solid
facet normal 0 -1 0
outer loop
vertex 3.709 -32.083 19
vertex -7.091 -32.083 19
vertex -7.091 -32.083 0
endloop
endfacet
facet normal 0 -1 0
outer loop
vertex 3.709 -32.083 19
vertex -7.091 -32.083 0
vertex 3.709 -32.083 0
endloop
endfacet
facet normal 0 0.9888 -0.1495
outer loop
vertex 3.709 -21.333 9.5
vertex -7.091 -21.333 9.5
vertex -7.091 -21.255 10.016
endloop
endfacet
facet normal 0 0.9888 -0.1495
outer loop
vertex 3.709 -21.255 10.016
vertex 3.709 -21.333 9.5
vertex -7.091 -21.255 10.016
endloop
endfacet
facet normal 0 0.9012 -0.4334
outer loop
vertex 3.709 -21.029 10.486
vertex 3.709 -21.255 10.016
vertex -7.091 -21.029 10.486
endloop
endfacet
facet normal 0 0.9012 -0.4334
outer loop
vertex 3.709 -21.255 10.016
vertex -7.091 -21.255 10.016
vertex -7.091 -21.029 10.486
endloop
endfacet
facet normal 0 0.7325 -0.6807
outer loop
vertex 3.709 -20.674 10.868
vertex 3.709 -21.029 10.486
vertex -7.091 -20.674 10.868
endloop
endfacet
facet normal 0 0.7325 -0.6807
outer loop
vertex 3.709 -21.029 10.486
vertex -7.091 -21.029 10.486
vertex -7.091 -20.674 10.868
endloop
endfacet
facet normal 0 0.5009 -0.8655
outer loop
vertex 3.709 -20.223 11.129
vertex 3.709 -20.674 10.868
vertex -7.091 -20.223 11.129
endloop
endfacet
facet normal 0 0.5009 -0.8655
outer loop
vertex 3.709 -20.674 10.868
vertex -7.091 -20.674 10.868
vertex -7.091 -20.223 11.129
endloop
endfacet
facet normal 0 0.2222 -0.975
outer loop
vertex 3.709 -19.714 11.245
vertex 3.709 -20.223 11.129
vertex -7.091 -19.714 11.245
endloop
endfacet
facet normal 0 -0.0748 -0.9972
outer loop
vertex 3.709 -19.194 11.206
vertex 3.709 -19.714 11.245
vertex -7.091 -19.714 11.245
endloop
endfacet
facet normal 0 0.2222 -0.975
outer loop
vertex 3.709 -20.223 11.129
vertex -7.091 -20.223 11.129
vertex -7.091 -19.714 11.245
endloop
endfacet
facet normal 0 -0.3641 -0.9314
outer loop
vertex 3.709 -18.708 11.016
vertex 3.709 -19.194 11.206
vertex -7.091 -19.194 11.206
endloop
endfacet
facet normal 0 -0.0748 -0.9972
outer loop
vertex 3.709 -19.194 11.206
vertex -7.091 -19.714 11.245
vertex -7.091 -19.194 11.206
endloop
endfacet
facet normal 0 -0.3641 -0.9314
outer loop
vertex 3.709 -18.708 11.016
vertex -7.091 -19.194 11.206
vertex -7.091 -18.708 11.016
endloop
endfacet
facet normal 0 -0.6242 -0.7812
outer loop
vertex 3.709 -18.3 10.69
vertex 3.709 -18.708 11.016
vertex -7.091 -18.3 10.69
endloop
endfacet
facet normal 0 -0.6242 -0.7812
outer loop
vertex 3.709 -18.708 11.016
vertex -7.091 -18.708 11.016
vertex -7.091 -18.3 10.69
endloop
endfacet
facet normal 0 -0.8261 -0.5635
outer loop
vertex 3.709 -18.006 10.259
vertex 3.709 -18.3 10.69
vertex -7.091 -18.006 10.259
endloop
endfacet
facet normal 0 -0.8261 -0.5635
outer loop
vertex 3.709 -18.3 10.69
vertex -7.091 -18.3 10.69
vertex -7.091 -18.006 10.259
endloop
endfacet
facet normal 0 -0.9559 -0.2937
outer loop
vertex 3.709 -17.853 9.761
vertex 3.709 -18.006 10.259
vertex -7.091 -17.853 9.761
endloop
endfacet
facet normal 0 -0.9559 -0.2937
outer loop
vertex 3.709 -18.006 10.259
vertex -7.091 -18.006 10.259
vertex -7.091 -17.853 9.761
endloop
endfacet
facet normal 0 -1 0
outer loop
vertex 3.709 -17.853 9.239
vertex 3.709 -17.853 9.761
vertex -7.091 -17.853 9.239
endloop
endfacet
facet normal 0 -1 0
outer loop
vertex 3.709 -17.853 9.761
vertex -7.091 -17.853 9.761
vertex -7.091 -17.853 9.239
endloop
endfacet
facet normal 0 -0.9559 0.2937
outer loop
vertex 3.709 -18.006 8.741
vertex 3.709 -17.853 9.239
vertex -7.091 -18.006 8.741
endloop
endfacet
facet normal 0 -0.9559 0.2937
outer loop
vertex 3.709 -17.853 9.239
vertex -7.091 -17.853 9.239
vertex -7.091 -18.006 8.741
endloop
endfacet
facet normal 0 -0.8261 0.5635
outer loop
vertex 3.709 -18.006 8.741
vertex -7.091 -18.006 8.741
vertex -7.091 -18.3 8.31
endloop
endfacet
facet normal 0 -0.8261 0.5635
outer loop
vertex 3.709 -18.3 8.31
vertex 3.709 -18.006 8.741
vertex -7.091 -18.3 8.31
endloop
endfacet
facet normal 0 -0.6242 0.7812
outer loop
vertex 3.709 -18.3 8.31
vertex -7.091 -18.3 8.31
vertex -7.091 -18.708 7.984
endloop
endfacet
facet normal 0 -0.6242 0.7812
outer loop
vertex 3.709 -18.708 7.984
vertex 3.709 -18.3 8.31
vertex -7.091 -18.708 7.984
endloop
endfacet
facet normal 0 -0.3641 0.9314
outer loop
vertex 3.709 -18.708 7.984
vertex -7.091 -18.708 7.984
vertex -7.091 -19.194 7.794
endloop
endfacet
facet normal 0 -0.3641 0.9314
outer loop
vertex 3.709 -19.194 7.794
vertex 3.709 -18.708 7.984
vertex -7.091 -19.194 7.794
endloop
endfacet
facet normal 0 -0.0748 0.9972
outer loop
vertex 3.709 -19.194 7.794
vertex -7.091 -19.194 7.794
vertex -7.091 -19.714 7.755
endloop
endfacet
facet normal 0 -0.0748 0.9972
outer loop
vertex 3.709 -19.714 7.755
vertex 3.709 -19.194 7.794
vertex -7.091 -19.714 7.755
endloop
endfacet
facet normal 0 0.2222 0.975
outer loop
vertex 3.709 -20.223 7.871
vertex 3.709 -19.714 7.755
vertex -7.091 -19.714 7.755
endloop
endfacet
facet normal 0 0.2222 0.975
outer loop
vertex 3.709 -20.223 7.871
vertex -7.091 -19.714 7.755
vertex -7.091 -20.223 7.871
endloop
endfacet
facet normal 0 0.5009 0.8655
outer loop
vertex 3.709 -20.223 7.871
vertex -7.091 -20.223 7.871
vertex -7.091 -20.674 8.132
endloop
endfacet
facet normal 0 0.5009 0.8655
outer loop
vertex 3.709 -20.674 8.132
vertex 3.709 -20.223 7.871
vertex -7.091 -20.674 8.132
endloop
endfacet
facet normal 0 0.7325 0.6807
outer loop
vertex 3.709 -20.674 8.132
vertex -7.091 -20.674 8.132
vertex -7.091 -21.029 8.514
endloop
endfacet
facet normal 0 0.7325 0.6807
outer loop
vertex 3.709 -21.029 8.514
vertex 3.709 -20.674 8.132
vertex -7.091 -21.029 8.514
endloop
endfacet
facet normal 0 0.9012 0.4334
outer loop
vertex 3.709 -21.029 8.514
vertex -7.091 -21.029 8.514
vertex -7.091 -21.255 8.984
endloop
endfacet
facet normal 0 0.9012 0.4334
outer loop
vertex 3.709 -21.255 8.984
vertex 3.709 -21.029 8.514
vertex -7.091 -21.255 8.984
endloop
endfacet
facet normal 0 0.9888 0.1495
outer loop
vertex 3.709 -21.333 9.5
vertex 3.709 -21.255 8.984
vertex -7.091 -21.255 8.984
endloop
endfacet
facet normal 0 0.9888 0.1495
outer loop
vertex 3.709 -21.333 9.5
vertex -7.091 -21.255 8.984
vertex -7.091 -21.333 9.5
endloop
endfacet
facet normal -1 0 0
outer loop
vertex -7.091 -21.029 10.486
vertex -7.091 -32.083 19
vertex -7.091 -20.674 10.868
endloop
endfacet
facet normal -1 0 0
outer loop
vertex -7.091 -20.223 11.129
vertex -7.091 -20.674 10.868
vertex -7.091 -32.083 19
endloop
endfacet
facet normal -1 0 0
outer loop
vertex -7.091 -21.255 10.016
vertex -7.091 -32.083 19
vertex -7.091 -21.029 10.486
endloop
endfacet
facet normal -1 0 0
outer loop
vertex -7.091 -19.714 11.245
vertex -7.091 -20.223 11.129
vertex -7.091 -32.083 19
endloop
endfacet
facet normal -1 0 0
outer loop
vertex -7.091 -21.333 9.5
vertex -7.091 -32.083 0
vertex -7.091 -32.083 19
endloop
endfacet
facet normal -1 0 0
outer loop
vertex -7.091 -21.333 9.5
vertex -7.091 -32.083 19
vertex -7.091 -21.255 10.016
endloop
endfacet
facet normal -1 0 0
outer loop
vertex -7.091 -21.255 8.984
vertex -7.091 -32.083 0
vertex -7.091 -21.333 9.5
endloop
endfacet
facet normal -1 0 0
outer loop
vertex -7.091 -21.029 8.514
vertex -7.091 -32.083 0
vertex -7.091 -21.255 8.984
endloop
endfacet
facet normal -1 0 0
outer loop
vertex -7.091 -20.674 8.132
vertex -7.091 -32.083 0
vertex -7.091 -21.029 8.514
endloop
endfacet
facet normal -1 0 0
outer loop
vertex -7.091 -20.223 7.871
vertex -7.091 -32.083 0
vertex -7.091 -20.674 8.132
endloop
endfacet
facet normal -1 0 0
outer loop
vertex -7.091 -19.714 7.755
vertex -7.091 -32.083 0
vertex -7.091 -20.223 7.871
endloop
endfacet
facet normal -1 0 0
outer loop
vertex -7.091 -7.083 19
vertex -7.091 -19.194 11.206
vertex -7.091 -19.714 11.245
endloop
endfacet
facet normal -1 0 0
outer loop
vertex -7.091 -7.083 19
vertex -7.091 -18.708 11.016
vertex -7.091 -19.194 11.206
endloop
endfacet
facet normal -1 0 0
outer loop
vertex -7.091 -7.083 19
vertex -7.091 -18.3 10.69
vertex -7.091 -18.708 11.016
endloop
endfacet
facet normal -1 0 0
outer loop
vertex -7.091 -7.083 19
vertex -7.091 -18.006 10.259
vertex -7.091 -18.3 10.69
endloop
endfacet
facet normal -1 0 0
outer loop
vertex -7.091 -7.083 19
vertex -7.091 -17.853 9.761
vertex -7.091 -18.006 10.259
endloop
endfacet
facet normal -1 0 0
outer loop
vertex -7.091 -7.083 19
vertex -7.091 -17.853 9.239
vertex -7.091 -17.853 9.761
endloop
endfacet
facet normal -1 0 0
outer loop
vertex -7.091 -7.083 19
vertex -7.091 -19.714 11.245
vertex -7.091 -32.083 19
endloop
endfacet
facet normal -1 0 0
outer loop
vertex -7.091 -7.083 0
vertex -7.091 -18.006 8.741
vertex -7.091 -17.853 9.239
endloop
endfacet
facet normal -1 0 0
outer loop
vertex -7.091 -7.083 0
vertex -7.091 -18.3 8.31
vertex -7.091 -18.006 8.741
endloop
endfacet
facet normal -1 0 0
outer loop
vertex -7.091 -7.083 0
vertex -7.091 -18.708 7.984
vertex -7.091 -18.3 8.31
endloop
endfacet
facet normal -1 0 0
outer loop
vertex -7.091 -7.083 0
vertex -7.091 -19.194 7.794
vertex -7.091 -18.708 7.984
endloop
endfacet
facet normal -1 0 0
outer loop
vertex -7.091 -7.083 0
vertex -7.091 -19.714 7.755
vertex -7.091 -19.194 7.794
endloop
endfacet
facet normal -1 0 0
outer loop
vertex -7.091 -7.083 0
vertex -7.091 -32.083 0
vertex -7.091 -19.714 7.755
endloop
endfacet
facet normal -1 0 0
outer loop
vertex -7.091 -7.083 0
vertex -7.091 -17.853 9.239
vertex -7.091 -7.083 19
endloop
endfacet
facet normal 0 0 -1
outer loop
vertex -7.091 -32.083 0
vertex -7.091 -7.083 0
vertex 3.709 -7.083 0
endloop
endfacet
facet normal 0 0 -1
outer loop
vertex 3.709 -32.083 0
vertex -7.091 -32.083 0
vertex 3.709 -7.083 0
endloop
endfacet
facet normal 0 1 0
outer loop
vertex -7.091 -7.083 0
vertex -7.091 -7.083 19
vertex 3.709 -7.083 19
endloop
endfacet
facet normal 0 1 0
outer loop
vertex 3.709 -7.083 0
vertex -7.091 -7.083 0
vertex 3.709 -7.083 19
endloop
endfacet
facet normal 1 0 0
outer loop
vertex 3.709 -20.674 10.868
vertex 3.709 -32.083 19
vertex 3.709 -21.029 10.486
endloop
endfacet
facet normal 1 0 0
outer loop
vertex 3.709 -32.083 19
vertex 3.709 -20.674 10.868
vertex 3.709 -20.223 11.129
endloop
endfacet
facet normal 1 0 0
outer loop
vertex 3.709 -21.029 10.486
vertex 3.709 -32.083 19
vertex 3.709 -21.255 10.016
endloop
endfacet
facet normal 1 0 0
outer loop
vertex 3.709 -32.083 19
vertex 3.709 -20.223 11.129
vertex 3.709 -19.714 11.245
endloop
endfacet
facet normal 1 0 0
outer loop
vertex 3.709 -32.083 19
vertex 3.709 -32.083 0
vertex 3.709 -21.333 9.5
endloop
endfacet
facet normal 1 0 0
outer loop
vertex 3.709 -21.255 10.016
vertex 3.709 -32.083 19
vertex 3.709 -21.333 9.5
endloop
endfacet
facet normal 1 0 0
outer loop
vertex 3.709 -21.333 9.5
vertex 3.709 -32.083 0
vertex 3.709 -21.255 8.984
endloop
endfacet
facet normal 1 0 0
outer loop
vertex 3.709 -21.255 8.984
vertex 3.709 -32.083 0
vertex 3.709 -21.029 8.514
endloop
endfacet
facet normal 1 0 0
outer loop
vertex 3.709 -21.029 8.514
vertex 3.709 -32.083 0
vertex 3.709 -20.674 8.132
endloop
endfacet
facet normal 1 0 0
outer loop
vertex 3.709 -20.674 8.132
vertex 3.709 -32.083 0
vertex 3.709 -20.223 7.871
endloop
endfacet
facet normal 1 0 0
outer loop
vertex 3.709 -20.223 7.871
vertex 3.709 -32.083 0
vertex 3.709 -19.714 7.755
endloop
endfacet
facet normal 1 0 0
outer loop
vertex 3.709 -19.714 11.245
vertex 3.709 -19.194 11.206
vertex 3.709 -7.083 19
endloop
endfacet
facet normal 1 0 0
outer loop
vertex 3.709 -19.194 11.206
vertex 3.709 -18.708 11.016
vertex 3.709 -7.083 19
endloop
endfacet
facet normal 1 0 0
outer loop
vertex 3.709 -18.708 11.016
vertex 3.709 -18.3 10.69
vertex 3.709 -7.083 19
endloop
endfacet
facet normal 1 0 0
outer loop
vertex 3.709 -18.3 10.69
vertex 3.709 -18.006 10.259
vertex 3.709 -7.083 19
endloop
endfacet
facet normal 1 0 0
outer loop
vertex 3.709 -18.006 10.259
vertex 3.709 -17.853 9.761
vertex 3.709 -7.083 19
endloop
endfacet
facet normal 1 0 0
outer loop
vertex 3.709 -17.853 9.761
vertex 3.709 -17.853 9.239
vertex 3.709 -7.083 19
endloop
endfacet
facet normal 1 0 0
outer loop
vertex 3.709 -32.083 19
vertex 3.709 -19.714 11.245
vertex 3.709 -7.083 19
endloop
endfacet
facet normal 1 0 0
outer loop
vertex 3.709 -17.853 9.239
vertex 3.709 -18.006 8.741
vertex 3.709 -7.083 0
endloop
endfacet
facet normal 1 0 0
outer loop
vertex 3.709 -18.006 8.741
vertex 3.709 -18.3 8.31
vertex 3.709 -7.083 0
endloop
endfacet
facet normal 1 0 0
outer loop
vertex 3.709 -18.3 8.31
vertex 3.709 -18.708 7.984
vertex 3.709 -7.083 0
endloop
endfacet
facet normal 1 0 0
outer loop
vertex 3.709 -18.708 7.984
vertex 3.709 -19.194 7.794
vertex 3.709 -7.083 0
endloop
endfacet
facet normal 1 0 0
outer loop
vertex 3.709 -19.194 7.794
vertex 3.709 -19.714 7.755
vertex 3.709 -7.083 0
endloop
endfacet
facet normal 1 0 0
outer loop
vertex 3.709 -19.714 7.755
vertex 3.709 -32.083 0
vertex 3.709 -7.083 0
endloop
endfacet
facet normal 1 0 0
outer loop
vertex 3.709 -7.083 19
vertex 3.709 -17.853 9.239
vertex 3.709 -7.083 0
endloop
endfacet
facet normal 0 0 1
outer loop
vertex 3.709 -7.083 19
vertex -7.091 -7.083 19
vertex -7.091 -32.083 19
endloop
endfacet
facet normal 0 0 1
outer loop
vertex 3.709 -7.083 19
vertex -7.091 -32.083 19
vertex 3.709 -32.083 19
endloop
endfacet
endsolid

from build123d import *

# Parameters (mm, degrees)
F0_W     = 10.8
F0_H     = 25
F1_DEPTH = 19
F3_D     = 3.5
F3_DEPTH = 20


with BuildPart() as f1:
    # F0 (on Top) → F1 (new body)
    with BuildSketch(Plane.XY):
        with Locations((-1.690517, -19.583154)):
            Rectangle(F0_W, F0_H)
    extrude(amount=F1_DEPTH)

    # F3
    with Locations(Plane.YZ.offset(3.709483)):
        with Locations((-19.583154, 9.5)):
            Hole(F3_D / 2, depth=F3_DEPTH)


solid = f1.part
